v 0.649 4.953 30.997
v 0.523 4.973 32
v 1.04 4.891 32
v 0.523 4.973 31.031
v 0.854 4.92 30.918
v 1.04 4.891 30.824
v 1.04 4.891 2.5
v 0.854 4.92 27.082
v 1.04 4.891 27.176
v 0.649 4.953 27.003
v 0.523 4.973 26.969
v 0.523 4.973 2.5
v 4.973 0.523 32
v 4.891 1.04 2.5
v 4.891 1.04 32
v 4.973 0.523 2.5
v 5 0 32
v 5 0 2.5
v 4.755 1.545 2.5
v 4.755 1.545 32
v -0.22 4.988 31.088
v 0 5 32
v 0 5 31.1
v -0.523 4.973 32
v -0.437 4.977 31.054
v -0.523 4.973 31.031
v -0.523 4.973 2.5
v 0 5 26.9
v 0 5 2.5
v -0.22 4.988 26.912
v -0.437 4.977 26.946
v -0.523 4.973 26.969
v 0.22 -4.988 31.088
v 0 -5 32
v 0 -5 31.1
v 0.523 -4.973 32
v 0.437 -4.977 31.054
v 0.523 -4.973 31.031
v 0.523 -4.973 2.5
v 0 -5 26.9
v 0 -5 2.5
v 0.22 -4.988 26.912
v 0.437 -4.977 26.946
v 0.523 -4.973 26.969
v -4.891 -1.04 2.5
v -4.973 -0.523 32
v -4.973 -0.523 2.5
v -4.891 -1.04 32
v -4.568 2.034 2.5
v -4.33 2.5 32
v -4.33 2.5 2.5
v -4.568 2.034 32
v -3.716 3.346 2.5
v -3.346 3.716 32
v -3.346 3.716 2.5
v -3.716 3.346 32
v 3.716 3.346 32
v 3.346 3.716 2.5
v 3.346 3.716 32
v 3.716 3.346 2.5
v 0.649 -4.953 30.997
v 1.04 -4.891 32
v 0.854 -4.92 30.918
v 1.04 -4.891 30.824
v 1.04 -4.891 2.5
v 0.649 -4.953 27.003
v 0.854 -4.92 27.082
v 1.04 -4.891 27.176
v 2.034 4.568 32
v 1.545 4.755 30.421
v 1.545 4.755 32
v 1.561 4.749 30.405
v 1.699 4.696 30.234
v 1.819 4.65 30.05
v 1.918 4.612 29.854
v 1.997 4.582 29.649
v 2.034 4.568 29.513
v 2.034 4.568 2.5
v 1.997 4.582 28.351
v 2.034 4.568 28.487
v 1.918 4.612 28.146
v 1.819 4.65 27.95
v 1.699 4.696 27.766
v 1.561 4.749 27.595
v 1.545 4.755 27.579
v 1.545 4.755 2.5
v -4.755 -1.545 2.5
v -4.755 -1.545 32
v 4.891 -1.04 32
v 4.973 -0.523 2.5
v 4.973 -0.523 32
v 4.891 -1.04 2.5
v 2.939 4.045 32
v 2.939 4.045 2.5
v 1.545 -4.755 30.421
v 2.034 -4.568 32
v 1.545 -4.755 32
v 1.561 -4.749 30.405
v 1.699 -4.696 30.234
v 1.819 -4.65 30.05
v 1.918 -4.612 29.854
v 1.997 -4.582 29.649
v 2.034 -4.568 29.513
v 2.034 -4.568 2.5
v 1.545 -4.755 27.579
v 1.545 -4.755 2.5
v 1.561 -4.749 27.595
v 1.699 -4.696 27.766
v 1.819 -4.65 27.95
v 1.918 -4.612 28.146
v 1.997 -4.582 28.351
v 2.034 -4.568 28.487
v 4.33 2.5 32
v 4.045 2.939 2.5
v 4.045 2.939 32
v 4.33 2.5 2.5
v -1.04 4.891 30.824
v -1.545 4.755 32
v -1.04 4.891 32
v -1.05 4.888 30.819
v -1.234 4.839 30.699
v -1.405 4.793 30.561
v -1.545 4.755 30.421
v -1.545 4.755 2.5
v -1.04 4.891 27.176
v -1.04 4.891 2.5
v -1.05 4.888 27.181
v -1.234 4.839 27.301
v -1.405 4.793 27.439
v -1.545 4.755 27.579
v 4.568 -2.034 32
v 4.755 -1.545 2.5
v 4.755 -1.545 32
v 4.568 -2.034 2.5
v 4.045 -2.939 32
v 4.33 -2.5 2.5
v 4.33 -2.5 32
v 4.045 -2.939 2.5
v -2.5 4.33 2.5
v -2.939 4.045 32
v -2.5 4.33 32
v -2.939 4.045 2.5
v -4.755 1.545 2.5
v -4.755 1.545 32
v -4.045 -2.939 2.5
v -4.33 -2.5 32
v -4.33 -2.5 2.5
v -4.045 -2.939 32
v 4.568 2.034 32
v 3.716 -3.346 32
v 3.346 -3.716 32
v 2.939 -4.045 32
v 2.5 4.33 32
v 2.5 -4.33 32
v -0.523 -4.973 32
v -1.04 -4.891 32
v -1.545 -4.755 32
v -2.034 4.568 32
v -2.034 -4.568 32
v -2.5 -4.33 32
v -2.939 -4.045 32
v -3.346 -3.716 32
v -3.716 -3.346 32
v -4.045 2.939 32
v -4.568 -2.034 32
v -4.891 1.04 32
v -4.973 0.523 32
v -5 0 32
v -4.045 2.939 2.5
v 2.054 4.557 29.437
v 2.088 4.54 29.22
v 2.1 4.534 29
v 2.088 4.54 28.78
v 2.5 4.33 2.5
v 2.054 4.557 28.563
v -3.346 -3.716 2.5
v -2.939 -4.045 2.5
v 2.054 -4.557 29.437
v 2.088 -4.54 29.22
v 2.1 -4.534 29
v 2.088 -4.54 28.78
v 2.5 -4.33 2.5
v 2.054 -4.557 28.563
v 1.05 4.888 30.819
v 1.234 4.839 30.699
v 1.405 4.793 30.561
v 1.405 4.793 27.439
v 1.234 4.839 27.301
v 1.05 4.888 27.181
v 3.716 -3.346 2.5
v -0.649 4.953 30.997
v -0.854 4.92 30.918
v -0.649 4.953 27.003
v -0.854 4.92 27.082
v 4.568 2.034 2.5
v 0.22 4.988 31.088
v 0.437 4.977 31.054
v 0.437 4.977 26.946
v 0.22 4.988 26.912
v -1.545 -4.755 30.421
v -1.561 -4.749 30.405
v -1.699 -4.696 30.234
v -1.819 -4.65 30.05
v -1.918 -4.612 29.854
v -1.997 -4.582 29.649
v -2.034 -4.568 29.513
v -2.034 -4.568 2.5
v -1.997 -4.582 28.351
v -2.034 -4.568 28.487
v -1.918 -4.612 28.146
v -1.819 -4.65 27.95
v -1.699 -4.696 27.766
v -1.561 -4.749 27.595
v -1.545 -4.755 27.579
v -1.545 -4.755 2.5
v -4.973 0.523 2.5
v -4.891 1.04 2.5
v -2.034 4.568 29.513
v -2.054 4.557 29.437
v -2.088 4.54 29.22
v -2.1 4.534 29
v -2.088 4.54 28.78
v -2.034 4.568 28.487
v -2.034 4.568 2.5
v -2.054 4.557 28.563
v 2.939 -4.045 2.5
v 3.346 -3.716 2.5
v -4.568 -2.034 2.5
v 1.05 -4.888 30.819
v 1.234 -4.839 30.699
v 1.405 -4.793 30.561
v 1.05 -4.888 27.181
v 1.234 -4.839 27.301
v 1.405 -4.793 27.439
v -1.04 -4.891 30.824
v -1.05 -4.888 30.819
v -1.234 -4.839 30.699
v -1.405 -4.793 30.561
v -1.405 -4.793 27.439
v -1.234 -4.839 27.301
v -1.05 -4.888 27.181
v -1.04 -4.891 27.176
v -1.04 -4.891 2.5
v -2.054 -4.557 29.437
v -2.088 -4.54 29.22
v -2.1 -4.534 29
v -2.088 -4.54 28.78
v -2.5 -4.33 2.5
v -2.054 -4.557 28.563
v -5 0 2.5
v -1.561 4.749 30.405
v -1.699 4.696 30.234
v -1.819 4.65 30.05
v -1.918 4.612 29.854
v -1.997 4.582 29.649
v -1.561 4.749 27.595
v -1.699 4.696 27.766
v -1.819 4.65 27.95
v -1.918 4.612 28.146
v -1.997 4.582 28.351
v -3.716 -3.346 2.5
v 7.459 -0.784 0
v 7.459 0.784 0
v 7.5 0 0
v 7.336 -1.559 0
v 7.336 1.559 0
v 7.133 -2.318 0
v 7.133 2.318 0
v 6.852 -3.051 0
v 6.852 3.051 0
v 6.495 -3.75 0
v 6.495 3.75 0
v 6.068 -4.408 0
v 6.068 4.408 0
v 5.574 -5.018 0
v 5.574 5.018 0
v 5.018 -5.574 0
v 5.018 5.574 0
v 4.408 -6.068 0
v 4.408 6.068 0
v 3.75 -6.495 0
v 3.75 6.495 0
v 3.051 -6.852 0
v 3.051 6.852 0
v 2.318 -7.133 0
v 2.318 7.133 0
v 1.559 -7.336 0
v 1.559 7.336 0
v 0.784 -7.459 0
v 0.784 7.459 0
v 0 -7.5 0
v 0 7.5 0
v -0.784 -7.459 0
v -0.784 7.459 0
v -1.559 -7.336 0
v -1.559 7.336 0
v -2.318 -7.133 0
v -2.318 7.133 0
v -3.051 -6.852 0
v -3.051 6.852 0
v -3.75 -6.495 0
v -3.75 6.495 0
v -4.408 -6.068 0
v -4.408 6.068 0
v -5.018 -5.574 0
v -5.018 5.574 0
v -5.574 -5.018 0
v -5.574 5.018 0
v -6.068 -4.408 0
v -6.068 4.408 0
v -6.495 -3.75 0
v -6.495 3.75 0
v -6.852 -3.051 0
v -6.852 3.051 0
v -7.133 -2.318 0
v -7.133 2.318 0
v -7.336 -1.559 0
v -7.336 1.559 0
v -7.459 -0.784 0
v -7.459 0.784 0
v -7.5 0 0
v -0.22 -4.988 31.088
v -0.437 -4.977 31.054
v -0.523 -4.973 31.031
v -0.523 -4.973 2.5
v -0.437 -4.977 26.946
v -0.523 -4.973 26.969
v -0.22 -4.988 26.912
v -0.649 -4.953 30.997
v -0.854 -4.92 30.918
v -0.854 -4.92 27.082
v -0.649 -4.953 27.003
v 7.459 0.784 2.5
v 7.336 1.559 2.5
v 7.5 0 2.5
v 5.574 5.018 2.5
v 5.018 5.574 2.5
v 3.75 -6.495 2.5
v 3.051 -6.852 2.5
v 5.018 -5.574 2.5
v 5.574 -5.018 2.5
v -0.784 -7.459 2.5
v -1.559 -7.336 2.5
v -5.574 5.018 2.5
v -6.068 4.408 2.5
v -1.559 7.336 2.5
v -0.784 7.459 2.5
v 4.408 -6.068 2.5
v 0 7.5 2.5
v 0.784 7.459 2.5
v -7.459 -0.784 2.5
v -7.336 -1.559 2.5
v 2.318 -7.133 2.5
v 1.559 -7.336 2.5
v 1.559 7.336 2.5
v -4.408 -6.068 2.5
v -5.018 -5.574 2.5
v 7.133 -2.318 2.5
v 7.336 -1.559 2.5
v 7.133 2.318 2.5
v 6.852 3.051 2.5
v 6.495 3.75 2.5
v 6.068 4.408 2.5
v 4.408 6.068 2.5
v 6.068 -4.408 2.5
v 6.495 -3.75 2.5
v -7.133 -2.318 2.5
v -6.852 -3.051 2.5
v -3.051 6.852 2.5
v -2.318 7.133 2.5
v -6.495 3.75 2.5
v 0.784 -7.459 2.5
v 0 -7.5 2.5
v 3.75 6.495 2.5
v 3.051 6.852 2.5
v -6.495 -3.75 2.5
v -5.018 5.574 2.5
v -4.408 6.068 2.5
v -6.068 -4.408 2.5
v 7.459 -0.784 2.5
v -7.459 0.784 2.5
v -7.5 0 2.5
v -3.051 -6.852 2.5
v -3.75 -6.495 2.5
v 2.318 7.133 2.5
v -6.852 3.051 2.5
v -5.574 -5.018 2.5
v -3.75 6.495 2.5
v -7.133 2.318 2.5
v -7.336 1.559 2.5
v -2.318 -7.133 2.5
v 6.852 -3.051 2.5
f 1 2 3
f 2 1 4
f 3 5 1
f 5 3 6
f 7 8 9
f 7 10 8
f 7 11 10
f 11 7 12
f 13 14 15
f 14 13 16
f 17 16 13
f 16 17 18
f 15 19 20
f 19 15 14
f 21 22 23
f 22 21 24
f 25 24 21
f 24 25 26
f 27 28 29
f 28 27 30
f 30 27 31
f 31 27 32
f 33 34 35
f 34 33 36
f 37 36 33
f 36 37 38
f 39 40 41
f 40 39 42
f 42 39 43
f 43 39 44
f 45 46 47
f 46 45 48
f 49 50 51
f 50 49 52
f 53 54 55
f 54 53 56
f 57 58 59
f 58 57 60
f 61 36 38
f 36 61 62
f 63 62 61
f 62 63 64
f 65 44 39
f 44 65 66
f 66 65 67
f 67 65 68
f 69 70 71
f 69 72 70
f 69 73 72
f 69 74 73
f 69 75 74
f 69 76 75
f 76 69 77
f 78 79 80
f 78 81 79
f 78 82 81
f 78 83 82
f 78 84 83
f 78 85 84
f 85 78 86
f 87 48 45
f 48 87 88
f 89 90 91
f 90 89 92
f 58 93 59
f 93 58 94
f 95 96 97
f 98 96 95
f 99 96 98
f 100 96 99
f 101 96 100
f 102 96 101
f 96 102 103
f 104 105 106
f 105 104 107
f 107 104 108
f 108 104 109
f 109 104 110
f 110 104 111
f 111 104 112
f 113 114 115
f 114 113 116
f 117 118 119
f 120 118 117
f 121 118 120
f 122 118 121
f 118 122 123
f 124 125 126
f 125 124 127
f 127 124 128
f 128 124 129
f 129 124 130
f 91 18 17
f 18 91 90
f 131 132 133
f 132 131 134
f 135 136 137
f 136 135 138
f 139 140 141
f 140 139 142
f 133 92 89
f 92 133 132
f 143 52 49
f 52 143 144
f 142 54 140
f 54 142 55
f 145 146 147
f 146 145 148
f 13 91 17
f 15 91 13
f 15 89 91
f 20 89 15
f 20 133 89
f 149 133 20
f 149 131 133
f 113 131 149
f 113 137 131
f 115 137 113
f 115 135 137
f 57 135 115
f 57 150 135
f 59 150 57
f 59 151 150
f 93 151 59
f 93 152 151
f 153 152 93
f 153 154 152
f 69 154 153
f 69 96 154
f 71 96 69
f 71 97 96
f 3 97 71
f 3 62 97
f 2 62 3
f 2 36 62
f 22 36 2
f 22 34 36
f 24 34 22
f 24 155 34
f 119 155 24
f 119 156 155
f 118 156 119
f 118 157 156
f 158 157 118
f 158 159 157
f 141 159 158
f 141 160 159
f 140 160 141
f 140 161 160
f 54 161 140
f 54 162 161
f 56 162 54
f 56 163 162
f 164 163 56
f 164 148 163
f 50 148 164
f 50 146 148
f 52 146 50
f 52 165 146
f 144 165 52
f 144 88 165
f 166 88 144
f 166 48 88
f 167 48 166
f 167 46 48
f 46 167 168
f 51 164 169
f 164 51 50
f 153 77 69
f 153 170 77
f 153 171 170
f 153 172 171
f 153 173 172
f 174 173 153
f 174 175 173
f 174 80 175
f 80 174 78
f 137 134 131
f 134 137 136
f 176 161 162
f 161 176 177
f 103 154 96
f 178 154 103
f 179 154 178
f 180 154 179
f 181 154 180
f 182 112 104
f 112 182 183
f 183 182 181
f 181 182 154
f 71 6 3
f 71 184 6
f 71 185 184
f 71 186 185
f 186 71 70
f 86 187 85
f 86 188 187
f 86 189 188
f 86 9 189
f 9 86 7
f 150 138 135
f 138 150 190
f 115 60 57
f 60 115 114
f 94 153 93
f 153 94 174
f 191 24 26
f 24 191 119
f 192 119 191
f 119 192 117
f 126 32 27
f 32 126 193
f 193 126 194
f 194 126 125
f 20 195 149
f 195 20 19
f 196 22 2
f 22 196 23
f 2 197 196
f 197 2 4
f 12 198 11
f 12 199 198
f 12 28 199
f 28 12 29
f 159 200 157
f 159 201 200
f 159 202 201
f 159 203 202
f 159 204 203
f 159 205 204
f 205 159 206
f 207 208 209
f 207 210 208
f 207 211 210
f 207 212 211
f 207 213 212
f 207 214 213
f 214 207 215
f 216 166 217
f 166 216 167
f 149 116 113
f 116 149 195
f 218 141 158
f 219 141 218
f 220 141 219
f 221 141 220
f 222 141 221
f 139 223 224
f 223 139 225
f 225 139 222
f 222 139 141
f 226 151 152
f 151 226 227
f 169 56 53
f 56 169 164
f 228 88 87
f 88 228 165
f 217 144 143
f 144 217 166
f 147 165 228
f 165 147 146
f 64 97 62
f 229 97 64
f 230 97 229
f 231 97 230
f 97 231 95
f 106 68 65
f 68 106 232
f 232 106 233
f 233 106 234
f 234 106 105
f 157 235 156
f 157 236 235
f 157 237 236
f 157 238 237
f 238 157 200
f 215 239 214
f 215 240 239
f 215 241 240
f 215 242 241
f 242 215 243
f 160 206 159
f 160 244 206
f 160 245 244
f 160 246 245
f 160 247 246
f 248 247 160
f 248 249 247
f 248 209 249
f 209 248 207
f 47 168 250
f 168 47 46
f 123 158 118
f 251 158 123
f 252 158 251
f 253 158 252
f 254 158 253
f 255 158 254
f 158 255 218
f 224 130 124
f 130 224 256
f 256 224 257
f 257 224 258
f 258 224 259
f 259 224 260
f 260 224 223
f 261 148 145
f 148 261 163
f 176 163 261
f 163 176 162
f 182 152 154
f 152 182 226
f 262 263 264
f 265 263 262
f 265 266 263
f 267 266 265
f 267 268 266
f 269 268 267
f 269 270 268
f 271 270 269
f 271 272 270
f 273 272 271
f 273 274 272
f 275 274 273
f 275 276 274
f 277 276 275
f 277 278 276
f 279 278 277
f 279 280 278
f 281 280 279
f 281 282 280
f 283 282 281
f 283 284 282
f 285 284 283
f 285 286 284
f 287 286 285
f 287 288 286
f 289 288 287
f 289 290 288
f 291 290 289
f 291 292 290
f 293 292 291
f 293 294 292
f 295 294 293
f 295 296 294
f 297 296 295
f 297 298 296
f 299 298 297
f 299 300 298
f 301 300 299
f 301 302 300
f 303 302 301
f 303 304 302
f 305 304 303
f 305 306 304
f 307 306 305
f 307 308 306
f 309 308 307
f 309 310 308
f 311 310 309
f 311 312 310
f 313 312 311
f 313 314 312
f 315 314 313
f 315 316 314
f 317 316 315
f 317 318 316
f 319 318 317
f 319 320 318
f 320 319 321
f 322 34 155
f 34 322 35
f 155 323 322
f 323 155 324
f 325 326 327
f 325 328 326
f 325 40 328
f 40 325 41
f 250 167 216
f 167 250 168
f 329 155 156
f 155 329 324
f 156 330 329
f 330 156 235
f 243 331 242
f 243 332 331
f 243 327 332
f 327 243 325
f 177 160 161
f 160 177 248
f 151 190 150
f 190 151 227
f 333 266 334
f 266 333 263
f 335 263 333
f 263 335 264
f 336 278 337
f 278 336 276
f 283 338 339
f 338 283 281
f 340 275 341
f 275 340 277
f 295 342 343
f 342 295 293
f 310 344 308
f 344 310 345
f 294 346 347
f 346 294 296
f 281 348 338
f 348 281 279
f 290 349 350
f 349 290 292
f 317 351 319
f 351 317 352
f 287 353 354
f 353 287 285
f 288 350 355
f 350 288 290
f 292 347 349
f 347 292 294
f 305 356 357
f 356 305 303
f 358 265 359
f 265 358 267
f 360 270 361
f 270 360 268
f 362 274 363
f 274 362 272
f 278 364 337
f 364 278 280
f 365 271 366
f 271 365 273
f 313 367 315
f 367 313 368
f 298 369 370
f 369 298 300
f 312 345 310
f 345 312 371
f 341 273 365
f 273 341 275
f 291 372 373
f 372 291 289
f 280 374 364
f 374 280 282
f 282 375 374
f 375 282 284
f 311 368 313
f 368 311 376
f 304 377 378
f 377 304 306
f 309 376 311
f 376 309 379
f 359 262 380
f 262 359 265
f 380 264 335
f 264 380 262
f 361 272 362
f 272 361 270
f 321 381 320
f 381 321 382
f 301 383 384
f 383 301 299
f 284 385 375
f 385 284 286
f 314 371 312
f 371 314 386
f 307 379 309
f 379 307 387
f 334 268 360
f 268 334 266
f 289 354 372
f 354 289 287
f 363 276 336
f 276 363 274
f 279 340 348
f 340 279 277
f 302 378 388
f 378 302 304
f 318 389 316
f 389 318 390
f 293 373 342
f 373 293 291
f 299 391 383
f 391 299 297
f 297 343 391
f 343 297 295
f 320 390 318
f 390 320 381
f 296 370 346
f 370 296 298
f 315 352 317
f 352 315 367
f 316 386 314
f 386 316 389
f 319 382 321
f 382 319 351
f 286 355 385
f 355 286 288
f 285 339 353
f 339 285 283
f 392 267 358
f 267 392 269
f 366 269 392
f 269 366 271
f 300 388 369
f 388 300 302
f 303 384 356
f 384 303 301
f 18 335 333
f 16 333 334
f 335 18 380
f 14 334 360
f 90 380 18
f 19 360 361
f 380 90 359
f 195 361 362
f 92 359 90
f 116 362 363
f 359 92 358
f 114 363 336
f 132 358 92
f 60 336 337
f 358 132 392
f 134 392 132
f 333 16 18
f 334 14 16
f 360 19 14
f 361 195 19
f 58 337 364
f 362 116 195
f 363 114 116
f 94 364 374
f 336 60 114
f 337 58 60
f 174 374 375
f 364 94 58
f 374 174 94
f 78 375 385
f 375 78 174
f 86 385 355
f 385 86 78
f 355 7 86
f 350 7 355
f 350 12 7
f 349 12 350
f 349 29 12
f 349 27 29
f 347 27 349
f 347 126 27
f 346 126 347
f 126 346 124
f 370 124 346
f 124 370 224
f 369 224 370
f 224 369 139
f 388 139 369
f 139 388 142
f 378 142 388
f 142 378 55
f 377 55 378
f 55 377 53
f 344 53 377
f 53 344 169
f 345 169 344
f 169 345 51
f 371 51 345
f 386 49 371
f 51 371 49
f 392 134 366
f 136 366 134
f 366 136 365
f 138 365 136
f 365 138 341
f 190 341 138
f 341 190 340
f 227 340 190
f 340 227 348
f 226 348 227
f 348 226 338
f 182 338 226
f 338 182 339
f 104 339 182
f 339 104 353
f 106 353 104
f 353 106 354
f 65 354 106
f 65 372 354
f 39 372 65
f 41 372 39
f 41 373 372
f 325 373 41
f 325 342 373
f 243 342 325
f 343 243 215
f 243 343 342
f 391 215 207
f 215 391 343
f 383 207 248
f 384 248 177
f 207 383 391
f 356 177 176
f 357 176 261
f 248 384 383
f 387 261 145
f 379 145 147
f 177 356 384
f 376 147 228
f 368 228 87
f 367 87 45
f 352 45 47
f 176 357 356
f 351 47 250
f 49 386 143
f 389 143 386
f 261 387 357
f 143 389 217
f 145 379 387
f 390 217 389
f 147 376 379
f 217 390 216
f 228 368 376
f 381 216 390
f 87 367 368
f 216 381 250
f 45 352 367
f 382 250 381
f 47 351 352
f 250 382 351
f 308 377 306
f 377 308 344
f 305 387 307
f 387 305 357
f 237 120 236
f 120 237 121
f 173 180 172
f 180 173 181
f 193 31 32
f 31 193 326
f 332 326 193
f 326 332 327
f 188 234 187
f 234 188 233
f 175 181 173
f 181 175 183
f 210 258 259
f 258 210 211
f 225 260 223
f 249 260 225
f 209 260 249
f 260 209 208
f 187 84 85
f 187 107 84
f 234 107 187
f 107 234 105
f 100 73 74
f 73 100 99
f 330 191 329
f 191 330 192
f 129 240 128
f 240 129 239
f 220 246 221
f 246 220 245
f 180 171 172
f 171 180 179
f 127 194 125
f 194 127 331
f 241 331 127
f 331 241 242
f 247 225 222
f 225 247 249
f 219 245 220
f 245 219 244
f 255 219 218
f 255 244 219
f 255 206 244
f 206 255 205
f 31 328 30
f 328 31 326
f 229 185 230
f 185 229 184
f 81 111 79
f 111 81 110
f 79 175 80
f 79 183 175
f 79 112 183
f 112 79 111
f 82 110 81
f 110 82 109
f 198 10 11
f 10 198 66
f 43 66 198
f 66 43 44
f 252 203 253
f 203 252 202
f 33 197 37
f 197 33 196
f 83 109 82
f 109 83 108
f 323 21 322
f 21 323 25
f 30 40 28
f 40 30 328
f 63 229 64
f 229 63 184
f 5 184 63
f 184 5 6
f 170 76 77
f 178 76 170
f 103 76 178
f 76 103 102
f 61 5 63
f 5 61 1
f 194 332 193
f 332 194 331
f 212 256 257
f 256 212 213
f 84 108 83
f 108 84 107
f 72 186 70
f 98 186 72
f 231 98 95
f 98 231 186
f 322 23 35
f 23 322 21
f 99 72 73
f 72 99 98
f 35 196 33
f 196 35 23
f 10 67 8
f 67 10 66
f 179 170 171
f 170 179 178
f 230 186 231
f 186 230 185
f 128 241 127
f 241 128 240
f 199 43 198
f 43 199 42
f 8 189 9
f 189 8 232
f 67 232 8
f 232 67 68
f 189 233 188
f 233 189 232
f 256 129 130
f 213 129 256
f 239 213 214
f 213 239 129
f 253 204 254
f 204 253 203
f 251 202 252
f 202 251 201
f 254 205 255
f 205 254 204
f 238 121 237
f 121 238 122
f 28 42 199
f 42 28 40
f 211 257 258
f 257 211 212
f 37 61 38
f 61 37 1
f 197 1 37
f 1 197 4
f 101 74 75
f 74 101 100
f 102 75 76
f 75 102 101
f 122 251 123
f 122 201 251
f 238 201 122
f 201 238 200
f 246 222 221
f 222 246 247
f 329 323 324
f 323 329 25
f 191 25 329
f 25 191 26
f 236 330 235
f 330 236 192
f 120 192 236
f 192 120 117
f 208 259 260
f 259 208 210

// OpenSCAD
// Clevis pin with cross-hole.
$fn = 60;
eps = 0.02;
pin_d = 10;
pin_l = 32;
head_d = pin_d + 5;
difference() {
    union() { cylinder(d=pin_d,h=pin_l); cylinder(d=head_d,h=2.5); }
    translate([0,-pin_d-eps,pin_l-3]) rotate([-90,0,0]) cylinder(d=pin_d*0.42,h=2*pin_d+2*eps);
}
